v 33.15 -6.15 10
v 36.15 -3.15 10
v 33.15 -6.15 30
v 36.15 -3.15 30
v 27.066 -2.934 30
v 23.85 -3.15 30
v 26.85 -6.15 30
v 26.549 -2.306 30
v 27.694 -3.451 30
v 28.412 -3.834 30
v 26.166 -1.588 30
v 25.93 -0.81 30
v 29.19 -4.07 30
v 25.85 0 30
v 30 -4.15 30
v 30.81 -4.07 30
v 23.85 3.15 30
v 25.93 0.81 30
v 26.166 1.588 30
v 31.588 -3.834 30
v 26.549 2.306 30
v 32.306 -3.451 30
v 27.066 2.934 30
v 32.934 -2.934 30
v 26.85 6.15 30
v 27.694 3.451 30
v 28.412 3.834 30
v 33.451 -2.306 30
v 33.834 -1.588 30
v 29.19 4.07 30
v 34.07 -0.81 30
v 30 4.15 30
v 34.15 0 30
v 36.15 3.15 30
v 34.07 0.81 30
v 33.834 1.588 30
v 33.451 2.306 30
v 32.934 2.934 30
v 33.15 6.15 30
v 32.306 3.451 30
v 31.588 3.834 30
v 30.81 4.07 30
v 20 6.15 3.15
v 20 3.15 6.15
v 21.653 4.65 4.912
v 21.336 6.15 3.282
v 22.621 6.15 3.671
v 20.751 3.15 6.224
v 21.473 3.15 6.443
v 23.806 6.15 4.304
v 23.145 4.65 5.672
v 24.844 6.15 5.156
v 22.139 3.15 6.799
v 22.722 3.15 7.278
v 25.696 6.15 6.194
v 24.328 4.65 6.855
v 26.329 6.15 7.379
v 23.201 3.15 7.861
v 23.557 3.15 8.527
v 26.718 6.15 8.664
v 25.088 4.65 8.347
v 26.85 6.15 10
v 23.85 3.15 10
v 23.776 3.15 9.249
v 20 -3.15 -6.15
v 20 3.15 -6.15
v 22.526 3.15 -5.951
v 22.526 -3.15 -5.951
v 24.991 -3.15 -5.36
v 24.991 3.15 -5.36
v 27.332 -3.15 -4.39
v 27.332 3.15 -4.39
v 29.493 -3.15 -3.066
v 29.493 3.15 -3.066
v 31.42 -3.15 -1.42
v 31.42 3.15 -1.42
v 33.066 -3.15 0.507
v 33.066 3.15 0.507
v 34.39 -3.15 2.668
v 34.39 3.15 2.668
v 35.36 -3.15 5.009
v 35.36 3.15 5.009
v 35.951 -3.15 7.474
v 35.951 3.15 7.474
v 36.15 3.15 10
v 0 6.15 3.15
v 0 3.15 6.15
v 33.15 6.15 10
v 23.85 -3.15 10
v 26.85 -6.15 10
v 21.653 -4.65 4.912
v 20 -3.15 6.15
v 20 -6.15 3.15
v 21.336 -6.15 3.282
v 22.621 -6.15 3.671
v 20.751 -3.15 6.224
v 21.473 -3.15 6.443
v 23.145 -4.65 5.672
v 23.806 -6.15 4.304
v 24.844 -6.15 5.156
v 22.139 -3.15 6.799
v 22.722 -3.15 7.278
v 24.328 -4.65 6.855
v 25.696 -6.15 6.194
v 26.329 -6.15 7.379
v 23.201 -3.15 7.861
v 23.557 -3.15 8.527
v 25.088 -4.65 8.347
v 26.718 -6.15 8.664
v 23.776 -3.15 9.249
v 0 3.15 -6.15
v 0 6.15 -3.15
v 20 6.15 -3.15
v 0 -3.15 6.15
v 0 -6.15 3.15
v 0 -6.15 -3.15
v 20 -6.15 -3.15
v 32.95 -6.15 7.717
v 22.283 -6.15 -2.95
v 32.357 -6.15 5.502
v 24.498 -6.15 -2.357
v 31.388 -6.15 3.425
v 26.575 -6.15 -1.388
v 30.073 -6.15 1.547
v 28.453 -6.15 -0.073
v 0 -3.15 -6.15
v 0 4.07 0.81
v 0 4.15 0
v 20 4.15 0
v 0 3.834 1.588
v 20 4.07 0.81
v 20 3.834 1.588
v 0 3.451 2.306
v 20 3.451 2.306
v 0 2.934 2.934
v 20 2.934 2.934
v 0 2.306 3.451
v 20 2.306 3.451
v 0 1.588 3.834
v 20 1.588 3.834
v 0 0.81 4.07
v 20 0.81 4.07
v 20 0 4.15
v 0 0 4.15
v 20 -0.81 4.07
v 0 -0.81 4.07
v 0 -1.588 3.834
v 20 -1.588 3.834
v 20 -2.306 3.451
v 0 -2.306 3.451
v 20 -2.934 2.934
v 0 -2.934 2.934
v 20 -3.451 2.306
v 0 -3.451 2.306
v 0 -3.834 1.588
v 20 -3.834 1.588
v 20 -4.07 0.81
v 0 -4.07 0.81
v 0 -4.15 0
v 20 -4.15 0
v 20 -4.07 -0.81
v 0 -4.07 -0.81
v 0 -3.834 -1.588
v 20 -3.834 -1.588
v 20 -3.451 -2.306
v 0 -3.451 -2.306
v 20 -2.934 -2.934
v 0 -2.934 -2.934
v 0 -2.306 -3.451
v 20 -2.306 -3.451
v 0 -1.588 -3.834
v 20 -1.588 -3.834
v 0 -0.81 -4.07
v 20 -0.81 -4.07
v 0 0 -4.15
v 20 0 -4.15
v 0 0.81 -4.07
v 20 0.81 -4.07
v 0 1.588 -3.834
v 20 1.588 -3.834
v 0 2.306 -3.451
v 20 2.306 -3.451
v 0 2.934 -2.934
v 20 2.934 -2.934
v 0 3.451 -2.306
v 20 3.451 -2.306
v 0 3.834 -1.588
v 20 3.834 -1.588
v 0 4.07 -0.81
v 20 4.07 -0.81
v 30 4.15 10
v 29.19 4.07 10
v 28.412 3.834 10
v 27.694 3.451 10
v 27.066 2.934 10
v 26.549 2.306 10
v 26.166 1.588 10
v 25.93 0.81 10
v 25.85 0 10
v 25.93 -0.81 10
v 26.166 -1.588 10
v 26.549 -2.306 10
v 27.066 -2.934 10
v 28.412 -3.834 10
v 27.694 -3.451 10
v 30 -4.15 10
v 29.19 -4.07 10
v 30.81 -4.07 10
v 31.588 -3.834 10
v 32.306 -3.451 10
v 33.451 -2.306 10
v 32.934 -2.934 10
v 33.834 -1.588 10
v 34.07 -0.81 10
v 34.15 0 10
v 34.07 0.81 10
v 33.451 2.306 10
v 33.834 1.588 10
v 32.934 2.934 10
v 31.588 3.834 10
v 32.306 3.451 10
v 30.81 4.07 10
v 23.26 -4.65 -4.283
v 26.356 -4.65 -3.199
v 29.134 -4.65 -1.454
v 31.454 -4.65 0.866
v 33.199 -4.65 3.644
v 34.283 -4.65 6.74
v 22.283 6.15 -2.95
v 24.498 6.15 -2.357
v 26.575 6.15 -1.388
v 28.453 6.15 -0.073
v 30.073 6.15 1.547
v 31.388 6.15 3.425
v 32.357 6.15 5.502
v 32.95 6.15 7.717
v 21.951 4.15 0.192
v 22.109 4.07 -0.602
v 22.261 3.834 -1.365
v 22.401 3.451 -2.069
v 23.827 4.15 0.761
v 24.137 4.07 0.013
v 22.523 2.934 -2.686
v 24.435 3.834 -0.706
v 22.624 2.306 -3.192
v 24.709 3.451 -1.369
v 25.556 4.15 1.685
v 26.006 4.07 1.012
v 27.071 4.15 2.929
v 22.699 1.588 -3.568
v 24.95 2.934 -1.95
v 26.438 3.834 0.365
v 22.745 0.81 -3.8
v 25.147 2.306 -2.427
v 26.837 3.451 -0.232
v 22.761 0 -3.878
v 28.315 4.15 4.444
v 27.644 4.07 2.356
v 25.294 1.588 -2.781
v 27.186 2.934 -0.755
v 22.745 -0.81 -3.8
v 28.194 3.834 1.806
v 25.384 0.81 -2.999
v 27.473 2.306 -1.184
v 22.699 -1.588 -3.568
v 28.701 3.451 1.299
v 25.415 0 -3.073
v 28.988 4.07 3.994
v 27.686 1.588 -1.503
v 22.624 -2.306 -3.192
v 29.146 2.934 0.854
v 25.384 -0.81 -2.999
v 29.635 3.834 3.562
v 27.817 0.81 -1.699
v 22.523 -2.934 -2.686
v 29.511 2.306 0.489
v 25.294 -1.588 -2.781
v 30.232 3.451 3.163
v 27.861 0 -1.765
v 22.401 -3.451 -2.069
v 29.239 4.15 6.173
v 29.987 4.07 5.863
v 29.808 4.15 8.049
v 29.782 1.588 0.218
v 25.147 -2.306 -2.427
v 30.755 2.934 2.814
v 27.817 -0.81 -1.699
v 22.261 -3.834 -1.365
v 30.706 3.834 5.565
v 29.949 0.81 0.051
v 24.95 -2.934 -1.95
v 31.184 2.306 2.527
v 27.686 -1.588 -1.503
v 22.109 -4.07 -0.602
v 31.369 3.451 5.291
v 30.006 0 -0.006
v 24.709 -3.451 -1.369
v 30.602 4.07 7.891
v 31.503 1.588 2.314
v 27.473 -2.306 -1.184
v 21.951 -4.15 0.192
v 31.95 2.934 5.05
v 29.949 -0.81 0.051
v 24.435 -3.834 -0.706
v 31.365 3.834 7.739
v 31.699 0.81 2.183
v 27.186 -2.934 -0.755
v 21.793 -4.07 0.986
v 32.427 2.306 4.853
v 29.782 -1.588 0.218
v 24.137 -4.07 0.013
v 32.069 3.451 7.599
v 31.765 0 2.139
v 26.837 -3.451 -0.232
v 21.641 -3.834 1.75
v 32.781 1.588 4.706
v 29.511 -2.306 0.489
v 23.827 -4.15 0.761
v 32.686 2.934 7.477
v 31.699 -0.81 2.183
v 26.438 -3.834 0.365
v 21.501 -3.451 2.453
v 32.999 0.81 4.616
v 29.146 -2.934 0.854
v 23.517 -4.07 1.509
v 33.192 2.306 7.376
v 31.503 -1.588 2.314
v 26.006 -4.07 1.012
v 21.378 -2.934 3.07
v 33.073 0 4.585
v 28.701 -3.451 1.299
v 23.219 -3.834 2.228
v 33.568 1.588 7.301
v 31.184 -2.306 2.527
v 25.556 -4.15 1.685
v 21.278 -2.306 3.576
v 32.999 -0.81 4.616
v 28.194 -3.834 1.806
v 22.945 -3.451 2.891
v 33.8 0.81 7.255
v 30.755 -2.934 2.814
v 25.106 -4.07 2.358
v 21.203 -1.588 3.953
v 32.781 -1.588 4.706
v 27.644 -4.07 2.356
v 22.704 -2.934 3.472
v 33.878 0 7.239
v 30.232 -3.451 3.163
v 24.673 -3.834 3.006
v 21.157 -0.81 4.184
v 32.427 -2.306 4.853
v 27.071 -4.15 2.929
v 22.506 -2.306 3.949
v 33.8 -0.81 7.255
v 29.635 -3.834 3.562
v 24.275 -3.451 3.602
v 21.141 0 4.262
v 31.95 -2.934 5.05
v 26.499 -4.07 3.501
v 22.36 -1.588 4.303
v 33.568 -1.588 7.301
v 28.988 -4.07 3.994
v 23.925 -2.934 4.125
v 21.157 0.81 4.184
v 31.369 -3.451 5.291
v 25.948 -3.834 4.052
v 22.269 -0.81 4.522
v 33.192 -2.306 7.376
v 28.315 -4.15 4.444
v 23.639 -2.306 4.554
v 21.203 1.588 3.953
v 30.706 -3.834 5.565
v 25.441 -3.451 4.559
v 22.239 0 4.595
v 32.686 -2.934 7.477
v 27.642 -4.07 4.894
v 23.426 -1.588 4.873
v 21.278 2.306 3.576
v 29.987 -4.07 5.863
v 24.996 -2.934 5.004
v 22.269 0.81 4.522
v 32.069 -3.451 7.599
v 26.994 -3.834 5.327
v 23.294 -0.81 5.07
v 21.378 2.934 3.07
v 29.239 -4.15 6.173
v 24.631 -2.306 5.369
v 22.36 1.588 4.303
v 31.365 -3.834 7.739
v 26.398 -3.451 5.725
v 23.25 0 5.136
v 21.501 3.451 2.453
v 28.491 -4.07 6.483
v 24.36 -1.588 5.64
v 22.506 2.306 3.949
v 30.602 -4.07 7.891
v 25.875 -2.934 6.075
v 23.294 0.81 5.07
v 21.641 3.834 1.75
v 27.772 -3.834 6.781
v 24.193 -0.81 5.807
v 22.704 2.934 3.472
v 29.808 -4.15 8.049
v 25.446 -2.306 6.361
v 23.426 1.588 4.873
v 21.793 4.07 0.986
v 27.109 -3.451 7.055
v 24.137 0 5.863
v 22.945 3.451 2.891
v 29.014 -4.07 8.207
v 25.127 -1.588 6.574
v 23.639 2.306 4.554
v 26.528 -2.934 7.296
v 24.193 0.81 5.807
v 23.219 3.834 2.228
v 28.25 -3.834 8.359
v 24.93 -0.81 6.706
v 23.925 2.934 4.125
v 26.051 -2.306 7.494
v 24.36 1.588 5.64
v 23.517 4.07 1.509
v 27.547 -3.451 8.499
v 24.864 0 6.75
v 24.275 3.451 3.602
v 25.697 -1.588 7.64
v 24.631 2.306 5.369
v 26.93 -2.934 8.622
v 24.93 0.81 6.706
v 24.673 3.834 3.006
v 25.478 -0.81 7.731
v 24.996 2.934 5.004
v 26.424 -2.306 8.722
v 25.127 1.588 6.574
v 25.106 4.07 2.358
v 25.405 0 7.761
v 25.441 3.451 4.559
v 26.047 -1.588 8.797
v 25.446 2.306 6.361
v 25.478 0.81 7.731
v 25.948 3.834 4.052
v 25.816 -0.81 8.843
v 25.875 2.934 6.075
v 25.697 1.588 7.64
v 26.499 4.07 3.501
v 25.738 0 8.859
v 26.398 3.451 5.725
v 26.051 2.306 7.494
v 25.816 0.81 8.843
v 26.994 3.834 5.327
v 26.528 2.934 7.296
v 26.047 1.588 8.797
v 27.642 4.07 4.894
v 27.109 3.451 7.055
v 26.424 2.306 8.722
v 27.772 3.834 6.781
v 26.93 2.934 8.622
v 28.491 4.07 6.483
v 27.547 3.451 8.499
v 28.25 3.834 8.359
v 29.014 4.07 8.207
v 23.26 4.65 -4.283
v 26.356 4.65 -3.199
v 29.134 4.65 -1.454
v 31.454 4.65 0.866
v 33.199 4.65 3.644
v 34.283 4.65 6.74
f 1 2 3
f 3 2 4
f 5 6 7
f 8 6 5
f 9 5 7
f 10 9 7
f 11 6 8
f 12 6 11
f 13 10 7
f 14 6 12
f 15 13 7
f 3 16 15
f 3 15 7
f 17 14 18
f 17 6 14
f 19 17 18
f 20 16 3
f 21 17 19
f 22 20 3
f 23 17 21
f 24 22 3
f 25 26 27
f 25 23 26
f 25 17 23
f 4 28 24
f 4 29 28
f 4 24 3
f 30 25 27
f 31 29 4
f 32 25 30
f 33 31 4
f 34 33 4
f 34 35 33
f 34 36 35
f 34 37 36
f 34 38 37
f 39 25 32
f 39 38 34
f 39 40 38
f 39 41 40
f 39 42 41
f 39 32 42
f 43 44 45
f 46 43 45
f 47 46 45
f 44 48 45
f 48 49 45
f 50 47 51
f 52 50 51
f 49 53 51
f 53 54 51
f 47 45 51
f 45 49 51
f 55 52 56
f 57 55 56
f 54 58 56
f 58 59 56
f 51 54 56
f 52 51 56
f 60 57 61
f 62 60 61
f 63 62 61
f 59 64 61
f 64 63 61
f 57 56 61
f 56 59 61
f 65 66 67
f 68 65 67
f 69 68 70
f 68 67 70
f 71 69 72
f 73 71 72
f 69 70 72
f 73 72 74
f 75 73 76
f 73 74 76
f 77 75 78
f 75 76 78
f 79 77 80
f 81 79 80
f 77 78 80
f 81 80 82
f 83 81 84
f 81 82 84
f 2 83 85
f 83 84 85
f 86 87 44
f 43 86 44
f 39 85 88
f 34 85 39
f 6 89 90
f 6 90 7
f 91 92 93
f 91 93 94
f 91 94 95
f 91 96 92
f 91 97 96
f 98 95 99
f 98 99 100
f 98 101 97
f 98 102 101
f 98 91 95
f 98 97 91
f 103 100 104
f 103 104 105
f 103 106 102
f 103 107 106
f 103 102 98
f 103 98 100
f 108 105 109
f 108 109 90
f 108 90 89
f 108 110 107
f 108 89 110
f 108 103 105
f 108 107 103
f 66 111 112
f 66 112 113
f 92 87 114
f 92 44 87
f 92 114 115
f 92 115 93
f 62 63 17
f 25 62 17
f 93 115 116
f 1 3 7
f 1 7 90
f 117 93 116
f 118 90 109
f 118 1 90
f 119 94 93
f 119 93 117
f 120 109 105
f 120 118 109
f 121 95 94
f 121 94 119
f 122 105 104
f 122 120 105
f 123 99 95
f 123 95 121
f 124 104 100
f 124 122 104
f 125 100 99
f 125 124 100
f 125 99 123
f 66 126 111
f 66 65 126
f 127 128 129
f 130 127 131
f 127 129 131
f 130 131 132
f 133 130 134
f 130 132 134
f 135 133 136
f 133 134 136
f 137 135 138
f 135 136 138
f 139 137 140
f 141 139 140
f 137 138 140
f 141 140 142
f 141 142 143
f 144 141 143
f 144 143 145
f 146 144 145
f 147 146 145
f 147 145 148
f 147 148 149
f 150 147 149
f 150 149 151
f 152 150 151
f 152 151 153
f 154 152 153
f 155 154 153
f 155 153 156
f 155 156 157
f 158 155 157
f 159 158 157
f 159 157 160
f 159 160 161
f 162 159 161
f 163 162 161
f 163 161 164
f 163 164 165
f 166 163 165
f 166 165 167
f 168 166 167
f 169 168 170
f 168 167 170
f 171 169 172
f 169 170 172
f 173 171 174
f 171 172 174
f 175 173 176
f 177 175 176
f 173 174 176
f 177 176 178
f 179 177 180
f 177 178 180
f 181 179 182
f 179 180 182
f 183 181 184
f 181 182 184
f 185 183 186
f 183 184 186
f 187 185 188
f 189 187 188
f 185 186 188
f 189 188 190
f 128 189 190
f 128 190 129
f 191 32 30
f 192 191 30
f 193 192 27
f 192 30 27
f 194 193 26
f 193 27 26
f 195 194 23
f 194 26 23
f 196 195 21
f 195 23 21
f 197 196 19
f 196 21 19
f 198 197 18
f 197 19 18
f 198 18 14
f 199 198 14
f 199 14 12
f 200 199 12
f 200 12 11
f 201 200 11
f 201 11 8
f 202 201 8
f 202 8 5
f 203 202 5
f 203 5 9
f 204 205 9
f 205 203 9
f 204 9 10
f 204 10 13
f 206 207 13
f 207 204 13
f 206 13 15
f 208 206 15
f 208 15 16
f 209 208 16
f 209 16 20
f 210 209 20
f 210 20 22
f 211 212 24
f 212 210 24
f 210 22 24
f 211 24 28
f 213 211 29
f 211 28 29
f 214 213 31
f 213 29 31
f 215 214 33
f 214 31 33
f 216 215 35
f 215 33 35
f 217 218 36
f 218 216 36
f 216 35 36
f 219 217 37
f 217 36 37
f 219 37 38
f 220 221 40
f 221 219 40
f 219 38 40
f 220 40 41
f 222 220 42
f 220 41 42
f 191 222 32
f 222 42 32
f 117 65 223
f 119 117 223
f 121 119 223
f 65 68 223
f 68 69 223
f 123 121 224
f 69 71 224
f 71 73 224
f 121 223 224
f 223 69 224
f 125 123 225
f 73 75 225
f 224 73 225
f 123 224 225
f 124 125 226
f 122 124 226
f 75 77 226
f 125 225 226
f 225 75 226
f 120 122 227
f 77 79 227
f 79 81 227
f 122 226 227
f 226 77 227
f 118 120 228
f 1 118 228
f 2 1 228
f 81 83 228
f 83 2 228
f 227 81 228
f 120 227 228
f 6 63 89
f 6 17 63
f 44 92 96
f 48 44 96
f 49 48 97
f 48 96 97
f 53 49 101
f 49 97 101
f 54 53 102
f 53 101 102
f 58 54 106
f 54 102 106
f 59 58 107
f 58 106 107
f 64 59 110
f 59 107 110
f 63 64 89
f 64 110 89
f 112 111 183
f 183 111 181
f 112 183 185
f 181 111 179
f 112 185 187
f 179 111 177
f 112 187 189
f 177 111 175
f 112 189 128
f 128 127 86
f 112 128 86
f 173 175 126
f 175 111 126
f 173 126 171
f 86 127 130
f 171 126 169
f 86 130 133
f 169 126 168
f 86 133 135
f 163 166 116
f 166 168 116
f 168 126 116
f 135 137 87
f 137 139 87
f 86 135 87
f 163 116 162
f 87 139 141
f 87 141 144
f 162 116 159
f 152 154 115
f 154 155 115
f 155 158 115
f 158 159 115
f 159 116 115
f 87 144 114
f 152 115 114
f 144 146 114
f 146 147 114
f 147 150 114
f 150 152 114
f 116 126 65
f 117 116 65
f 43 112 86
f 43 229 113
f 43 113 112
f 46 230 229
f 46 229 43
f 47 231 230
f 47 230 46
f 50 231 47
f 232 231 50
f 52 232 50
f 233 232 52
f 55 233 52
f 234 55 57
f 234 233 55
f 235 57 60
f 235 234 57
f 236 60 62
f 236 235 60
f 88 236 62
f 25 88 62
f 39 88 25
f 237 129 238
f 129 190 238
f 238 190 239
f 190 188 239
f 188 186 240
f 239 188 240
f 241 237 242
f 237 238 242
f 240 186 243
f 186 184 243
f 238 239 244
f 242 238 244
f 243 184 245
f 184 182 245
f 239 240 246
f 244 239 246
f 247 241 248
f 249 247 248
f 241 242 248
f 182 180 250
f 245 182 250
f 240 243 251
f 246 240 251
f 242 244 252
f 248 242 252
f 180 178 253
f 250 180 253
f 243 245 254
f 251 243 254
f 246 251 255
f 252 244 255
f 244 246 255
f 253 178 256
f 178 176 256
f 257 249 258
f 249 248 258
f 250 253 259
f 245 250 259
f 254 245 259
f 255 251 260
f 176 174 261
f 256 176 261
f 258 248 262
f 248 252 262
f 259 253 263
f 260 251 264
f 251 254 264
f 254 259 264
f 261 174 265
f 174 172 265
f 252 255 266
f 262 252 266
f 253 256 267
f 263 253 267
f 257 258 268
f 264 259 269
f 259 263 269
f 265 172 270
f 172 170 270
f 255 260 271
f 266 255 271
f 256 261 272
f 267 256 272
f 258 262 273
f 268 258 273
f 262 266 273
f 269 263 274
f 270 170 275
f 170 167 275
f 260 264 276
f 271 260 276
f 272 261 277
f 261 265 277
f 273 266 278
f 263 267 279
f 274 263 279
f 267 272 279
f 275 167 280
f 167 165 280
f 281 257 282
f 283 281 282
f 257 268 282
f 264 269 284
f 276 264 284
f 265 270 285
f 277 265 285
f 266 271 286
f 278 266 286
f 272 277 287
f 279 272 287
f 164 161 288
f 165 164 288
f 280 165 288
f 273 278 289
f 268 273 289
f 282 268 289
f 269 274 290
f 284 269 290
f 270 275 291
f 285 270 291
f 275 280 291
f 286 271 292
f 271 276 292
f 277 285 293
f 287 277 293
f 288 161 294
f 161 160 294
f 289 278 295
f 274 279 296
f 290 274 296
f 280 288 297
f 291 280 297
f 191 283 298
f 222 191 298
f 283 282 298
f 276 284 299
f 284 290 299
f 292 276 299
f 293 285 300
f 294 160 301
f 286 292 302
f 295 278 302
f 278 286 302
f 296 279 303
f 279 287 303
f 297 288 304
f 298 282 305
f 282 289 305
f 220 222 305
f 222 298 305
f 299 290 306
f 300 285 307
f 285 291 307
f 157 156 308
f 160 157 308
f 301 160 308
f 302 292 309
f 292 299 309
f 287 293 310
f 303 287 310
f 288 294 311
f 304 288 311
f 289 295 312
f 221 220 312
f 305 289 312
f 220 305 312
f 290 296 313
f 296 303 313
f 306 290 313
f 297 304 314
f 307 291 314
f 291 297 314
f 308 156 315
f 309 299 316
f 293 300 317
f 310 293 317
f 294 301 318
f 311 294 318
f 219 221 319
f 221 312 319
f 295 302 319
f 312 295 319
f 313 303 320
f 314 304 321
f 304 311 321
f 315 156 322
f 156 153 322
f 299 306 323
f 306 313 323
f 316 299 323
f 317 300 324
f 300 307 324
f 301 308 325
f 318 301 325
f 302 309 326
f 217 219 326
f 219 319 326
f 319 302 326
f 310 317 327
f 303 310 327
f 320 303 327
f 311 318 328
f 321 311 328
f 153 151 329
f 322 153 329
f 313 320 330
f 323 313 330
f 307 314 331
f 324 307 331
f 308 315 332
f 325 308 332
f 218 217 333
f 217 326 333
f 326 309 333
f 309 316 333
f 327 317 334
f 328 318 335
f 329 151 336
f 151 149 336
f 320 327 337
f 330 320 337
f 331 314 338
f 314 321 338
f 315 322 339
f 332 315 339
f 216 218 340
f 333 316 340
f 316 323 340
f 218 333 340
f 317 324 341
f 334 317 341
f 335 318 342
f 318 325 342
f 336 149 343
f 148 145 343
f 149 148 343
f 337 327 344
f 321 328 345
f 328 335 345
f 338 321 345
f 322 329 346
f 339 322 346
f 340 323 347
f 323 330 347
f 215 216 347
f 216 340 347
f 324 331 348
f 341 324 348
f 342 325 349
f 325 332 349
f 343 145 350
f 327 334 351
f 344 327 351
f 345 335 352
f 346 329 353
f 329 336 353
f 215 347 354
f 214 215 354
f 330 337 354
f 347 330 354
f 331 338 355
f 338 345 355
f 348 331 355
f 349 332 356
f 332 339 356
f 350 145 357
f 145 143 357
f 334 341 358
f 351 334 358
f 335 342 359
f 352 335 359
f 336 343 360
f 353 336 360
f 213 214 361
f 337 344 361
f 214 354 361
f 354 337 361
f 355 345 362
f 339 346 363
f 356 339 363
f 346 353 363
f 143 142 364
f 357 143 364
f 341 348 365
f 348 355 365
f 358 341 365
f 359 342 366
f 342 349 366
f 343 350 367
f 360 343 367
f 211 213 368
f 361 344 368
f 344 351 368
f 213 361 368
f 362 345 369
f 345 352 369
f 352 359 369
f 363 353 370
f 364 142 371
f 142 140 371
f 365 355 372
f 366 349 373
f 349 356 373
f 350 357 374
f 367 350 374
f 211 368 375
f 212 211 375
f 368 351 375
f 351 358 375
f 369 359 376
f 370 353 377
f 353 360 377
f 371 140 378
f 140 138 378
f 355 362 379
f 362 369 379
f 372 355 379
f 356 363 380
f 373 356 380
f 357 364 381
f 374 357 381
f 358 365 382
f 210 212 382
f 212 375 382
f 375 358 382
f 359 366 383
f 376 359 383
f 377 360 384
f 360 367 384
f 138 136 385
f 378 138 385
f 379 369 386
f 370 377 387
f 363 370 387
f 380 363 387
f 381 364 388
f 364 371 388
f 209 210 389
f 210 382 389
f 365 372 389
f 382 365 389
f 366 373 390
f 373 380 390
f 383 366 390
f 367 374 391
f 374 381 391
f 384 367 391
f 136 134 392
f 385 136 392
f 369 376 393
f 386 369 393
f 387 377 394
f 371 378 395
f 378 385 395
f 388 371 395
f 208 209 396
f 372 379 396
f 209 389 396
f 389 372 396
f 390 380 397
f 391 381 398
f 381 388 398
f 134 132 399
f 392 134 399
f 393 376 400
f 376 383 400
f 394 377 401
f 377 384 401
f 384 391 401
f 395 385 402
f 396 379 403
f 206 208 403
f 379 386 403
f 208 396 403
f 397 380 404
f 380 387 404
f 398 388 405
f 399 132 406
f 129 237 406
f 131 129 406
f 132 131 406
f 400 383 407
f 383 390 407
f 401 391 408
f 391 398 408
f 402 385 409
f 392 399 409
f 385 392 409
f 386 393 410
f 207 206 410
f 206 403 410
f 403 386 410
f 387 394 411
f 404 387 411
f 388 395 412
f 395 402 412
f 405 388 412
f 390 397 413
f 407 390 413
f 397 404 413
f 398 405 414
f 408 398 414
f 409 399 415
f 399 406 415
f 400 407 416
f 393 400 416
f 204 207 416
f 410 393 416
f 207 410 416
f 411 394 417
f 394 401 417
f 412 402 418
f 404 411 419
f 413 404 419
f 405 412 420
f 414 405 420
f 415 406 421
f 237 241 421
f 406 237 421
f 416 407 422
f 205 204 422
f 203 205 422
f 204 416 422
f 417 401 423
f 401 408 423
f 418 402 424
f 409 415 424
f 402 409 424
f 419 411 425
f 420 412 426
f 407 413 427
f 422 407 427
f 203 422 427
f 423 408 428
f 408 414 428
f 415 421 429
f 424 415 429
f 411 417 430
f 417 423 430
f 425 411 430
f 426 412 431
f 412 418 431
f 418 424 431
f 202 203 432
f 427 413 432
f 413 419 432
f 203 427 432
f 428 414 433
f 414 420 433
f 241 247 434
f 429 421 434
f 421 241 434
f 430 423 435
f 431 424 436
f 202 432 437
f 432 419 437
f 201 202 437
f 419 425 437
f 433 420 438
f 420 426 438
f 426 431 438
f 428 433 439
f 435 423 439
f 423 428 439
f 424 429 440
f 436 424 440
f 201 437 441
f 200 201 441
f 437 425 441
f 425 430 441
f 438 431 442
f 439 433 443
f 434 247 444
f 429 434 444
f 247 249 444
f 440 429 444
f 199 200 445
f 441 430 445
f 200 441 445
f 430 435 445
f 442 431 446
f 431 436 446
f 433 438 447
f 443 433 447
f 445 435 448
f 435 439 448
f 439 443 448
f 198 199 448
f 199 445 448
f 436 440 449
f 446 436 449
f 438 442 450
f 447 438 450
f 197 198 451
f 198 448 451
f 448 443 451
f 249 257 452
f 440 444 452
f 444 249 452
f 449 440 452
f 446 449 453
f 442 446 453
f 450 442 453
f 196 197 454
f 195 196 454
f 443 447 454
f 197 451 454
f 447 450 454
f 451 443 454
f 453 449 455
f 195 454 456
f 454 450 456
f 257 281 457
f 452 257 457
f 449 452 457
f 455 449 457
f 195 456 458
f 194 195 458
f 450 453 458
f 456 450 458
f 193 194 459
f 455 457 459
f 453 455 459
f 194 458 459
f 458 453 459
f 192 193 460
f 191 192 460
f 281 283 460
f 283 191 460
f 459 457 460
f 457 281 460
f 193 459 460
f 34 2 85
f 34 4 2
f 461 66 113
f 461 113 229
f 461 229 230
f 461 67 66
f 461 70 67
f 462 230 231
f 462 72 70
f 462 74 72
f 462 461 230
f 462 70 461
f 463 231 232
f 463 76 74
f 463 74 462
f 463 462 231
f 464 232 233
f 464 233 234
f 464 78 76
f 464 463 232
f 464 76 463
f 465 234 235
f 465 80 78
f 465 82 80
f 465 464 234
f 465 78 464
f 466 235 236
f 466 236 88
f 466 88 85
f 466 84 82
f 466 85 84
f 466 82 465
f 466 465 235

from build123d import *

# Parameters (mm, degrees)
F1_W    = 12.3
F1_H    = 12.3
F1_R    = 4.15
F3_SIZE = 3


with BuildPart() as f2:
    # F2: sweep along a path in F0
    with BuildLine(Plane.XZ) as f2_path:
        Line((0, 0), (20, 0))
        ThreePointArc((20, 0), (27.0710678119, 2.9289321881), (30, 10))
        Line((30, 10), (30, 30))
    # F1 (on Right) → F2 (sweep)
    with BuildSketch(Plane.YZ):
        Rectangle(F1_W, F1_H)
        Circle(F1_R, mode=Mode.SUBTRACT)
    sweep(path=f2_path.line)

    # F3
    f3_edges = [f2.edges().sort_by_distance(p)[0] for p in [
        (23.85, -6.15, 20),
        (36.15, -6.15, 20),
        (36.15, 6.15, 20),
        (23.85, 6.15, 20),
    ]]
    chamfer(f3_edges, length=F3_SIZE)


solid = f2.part
